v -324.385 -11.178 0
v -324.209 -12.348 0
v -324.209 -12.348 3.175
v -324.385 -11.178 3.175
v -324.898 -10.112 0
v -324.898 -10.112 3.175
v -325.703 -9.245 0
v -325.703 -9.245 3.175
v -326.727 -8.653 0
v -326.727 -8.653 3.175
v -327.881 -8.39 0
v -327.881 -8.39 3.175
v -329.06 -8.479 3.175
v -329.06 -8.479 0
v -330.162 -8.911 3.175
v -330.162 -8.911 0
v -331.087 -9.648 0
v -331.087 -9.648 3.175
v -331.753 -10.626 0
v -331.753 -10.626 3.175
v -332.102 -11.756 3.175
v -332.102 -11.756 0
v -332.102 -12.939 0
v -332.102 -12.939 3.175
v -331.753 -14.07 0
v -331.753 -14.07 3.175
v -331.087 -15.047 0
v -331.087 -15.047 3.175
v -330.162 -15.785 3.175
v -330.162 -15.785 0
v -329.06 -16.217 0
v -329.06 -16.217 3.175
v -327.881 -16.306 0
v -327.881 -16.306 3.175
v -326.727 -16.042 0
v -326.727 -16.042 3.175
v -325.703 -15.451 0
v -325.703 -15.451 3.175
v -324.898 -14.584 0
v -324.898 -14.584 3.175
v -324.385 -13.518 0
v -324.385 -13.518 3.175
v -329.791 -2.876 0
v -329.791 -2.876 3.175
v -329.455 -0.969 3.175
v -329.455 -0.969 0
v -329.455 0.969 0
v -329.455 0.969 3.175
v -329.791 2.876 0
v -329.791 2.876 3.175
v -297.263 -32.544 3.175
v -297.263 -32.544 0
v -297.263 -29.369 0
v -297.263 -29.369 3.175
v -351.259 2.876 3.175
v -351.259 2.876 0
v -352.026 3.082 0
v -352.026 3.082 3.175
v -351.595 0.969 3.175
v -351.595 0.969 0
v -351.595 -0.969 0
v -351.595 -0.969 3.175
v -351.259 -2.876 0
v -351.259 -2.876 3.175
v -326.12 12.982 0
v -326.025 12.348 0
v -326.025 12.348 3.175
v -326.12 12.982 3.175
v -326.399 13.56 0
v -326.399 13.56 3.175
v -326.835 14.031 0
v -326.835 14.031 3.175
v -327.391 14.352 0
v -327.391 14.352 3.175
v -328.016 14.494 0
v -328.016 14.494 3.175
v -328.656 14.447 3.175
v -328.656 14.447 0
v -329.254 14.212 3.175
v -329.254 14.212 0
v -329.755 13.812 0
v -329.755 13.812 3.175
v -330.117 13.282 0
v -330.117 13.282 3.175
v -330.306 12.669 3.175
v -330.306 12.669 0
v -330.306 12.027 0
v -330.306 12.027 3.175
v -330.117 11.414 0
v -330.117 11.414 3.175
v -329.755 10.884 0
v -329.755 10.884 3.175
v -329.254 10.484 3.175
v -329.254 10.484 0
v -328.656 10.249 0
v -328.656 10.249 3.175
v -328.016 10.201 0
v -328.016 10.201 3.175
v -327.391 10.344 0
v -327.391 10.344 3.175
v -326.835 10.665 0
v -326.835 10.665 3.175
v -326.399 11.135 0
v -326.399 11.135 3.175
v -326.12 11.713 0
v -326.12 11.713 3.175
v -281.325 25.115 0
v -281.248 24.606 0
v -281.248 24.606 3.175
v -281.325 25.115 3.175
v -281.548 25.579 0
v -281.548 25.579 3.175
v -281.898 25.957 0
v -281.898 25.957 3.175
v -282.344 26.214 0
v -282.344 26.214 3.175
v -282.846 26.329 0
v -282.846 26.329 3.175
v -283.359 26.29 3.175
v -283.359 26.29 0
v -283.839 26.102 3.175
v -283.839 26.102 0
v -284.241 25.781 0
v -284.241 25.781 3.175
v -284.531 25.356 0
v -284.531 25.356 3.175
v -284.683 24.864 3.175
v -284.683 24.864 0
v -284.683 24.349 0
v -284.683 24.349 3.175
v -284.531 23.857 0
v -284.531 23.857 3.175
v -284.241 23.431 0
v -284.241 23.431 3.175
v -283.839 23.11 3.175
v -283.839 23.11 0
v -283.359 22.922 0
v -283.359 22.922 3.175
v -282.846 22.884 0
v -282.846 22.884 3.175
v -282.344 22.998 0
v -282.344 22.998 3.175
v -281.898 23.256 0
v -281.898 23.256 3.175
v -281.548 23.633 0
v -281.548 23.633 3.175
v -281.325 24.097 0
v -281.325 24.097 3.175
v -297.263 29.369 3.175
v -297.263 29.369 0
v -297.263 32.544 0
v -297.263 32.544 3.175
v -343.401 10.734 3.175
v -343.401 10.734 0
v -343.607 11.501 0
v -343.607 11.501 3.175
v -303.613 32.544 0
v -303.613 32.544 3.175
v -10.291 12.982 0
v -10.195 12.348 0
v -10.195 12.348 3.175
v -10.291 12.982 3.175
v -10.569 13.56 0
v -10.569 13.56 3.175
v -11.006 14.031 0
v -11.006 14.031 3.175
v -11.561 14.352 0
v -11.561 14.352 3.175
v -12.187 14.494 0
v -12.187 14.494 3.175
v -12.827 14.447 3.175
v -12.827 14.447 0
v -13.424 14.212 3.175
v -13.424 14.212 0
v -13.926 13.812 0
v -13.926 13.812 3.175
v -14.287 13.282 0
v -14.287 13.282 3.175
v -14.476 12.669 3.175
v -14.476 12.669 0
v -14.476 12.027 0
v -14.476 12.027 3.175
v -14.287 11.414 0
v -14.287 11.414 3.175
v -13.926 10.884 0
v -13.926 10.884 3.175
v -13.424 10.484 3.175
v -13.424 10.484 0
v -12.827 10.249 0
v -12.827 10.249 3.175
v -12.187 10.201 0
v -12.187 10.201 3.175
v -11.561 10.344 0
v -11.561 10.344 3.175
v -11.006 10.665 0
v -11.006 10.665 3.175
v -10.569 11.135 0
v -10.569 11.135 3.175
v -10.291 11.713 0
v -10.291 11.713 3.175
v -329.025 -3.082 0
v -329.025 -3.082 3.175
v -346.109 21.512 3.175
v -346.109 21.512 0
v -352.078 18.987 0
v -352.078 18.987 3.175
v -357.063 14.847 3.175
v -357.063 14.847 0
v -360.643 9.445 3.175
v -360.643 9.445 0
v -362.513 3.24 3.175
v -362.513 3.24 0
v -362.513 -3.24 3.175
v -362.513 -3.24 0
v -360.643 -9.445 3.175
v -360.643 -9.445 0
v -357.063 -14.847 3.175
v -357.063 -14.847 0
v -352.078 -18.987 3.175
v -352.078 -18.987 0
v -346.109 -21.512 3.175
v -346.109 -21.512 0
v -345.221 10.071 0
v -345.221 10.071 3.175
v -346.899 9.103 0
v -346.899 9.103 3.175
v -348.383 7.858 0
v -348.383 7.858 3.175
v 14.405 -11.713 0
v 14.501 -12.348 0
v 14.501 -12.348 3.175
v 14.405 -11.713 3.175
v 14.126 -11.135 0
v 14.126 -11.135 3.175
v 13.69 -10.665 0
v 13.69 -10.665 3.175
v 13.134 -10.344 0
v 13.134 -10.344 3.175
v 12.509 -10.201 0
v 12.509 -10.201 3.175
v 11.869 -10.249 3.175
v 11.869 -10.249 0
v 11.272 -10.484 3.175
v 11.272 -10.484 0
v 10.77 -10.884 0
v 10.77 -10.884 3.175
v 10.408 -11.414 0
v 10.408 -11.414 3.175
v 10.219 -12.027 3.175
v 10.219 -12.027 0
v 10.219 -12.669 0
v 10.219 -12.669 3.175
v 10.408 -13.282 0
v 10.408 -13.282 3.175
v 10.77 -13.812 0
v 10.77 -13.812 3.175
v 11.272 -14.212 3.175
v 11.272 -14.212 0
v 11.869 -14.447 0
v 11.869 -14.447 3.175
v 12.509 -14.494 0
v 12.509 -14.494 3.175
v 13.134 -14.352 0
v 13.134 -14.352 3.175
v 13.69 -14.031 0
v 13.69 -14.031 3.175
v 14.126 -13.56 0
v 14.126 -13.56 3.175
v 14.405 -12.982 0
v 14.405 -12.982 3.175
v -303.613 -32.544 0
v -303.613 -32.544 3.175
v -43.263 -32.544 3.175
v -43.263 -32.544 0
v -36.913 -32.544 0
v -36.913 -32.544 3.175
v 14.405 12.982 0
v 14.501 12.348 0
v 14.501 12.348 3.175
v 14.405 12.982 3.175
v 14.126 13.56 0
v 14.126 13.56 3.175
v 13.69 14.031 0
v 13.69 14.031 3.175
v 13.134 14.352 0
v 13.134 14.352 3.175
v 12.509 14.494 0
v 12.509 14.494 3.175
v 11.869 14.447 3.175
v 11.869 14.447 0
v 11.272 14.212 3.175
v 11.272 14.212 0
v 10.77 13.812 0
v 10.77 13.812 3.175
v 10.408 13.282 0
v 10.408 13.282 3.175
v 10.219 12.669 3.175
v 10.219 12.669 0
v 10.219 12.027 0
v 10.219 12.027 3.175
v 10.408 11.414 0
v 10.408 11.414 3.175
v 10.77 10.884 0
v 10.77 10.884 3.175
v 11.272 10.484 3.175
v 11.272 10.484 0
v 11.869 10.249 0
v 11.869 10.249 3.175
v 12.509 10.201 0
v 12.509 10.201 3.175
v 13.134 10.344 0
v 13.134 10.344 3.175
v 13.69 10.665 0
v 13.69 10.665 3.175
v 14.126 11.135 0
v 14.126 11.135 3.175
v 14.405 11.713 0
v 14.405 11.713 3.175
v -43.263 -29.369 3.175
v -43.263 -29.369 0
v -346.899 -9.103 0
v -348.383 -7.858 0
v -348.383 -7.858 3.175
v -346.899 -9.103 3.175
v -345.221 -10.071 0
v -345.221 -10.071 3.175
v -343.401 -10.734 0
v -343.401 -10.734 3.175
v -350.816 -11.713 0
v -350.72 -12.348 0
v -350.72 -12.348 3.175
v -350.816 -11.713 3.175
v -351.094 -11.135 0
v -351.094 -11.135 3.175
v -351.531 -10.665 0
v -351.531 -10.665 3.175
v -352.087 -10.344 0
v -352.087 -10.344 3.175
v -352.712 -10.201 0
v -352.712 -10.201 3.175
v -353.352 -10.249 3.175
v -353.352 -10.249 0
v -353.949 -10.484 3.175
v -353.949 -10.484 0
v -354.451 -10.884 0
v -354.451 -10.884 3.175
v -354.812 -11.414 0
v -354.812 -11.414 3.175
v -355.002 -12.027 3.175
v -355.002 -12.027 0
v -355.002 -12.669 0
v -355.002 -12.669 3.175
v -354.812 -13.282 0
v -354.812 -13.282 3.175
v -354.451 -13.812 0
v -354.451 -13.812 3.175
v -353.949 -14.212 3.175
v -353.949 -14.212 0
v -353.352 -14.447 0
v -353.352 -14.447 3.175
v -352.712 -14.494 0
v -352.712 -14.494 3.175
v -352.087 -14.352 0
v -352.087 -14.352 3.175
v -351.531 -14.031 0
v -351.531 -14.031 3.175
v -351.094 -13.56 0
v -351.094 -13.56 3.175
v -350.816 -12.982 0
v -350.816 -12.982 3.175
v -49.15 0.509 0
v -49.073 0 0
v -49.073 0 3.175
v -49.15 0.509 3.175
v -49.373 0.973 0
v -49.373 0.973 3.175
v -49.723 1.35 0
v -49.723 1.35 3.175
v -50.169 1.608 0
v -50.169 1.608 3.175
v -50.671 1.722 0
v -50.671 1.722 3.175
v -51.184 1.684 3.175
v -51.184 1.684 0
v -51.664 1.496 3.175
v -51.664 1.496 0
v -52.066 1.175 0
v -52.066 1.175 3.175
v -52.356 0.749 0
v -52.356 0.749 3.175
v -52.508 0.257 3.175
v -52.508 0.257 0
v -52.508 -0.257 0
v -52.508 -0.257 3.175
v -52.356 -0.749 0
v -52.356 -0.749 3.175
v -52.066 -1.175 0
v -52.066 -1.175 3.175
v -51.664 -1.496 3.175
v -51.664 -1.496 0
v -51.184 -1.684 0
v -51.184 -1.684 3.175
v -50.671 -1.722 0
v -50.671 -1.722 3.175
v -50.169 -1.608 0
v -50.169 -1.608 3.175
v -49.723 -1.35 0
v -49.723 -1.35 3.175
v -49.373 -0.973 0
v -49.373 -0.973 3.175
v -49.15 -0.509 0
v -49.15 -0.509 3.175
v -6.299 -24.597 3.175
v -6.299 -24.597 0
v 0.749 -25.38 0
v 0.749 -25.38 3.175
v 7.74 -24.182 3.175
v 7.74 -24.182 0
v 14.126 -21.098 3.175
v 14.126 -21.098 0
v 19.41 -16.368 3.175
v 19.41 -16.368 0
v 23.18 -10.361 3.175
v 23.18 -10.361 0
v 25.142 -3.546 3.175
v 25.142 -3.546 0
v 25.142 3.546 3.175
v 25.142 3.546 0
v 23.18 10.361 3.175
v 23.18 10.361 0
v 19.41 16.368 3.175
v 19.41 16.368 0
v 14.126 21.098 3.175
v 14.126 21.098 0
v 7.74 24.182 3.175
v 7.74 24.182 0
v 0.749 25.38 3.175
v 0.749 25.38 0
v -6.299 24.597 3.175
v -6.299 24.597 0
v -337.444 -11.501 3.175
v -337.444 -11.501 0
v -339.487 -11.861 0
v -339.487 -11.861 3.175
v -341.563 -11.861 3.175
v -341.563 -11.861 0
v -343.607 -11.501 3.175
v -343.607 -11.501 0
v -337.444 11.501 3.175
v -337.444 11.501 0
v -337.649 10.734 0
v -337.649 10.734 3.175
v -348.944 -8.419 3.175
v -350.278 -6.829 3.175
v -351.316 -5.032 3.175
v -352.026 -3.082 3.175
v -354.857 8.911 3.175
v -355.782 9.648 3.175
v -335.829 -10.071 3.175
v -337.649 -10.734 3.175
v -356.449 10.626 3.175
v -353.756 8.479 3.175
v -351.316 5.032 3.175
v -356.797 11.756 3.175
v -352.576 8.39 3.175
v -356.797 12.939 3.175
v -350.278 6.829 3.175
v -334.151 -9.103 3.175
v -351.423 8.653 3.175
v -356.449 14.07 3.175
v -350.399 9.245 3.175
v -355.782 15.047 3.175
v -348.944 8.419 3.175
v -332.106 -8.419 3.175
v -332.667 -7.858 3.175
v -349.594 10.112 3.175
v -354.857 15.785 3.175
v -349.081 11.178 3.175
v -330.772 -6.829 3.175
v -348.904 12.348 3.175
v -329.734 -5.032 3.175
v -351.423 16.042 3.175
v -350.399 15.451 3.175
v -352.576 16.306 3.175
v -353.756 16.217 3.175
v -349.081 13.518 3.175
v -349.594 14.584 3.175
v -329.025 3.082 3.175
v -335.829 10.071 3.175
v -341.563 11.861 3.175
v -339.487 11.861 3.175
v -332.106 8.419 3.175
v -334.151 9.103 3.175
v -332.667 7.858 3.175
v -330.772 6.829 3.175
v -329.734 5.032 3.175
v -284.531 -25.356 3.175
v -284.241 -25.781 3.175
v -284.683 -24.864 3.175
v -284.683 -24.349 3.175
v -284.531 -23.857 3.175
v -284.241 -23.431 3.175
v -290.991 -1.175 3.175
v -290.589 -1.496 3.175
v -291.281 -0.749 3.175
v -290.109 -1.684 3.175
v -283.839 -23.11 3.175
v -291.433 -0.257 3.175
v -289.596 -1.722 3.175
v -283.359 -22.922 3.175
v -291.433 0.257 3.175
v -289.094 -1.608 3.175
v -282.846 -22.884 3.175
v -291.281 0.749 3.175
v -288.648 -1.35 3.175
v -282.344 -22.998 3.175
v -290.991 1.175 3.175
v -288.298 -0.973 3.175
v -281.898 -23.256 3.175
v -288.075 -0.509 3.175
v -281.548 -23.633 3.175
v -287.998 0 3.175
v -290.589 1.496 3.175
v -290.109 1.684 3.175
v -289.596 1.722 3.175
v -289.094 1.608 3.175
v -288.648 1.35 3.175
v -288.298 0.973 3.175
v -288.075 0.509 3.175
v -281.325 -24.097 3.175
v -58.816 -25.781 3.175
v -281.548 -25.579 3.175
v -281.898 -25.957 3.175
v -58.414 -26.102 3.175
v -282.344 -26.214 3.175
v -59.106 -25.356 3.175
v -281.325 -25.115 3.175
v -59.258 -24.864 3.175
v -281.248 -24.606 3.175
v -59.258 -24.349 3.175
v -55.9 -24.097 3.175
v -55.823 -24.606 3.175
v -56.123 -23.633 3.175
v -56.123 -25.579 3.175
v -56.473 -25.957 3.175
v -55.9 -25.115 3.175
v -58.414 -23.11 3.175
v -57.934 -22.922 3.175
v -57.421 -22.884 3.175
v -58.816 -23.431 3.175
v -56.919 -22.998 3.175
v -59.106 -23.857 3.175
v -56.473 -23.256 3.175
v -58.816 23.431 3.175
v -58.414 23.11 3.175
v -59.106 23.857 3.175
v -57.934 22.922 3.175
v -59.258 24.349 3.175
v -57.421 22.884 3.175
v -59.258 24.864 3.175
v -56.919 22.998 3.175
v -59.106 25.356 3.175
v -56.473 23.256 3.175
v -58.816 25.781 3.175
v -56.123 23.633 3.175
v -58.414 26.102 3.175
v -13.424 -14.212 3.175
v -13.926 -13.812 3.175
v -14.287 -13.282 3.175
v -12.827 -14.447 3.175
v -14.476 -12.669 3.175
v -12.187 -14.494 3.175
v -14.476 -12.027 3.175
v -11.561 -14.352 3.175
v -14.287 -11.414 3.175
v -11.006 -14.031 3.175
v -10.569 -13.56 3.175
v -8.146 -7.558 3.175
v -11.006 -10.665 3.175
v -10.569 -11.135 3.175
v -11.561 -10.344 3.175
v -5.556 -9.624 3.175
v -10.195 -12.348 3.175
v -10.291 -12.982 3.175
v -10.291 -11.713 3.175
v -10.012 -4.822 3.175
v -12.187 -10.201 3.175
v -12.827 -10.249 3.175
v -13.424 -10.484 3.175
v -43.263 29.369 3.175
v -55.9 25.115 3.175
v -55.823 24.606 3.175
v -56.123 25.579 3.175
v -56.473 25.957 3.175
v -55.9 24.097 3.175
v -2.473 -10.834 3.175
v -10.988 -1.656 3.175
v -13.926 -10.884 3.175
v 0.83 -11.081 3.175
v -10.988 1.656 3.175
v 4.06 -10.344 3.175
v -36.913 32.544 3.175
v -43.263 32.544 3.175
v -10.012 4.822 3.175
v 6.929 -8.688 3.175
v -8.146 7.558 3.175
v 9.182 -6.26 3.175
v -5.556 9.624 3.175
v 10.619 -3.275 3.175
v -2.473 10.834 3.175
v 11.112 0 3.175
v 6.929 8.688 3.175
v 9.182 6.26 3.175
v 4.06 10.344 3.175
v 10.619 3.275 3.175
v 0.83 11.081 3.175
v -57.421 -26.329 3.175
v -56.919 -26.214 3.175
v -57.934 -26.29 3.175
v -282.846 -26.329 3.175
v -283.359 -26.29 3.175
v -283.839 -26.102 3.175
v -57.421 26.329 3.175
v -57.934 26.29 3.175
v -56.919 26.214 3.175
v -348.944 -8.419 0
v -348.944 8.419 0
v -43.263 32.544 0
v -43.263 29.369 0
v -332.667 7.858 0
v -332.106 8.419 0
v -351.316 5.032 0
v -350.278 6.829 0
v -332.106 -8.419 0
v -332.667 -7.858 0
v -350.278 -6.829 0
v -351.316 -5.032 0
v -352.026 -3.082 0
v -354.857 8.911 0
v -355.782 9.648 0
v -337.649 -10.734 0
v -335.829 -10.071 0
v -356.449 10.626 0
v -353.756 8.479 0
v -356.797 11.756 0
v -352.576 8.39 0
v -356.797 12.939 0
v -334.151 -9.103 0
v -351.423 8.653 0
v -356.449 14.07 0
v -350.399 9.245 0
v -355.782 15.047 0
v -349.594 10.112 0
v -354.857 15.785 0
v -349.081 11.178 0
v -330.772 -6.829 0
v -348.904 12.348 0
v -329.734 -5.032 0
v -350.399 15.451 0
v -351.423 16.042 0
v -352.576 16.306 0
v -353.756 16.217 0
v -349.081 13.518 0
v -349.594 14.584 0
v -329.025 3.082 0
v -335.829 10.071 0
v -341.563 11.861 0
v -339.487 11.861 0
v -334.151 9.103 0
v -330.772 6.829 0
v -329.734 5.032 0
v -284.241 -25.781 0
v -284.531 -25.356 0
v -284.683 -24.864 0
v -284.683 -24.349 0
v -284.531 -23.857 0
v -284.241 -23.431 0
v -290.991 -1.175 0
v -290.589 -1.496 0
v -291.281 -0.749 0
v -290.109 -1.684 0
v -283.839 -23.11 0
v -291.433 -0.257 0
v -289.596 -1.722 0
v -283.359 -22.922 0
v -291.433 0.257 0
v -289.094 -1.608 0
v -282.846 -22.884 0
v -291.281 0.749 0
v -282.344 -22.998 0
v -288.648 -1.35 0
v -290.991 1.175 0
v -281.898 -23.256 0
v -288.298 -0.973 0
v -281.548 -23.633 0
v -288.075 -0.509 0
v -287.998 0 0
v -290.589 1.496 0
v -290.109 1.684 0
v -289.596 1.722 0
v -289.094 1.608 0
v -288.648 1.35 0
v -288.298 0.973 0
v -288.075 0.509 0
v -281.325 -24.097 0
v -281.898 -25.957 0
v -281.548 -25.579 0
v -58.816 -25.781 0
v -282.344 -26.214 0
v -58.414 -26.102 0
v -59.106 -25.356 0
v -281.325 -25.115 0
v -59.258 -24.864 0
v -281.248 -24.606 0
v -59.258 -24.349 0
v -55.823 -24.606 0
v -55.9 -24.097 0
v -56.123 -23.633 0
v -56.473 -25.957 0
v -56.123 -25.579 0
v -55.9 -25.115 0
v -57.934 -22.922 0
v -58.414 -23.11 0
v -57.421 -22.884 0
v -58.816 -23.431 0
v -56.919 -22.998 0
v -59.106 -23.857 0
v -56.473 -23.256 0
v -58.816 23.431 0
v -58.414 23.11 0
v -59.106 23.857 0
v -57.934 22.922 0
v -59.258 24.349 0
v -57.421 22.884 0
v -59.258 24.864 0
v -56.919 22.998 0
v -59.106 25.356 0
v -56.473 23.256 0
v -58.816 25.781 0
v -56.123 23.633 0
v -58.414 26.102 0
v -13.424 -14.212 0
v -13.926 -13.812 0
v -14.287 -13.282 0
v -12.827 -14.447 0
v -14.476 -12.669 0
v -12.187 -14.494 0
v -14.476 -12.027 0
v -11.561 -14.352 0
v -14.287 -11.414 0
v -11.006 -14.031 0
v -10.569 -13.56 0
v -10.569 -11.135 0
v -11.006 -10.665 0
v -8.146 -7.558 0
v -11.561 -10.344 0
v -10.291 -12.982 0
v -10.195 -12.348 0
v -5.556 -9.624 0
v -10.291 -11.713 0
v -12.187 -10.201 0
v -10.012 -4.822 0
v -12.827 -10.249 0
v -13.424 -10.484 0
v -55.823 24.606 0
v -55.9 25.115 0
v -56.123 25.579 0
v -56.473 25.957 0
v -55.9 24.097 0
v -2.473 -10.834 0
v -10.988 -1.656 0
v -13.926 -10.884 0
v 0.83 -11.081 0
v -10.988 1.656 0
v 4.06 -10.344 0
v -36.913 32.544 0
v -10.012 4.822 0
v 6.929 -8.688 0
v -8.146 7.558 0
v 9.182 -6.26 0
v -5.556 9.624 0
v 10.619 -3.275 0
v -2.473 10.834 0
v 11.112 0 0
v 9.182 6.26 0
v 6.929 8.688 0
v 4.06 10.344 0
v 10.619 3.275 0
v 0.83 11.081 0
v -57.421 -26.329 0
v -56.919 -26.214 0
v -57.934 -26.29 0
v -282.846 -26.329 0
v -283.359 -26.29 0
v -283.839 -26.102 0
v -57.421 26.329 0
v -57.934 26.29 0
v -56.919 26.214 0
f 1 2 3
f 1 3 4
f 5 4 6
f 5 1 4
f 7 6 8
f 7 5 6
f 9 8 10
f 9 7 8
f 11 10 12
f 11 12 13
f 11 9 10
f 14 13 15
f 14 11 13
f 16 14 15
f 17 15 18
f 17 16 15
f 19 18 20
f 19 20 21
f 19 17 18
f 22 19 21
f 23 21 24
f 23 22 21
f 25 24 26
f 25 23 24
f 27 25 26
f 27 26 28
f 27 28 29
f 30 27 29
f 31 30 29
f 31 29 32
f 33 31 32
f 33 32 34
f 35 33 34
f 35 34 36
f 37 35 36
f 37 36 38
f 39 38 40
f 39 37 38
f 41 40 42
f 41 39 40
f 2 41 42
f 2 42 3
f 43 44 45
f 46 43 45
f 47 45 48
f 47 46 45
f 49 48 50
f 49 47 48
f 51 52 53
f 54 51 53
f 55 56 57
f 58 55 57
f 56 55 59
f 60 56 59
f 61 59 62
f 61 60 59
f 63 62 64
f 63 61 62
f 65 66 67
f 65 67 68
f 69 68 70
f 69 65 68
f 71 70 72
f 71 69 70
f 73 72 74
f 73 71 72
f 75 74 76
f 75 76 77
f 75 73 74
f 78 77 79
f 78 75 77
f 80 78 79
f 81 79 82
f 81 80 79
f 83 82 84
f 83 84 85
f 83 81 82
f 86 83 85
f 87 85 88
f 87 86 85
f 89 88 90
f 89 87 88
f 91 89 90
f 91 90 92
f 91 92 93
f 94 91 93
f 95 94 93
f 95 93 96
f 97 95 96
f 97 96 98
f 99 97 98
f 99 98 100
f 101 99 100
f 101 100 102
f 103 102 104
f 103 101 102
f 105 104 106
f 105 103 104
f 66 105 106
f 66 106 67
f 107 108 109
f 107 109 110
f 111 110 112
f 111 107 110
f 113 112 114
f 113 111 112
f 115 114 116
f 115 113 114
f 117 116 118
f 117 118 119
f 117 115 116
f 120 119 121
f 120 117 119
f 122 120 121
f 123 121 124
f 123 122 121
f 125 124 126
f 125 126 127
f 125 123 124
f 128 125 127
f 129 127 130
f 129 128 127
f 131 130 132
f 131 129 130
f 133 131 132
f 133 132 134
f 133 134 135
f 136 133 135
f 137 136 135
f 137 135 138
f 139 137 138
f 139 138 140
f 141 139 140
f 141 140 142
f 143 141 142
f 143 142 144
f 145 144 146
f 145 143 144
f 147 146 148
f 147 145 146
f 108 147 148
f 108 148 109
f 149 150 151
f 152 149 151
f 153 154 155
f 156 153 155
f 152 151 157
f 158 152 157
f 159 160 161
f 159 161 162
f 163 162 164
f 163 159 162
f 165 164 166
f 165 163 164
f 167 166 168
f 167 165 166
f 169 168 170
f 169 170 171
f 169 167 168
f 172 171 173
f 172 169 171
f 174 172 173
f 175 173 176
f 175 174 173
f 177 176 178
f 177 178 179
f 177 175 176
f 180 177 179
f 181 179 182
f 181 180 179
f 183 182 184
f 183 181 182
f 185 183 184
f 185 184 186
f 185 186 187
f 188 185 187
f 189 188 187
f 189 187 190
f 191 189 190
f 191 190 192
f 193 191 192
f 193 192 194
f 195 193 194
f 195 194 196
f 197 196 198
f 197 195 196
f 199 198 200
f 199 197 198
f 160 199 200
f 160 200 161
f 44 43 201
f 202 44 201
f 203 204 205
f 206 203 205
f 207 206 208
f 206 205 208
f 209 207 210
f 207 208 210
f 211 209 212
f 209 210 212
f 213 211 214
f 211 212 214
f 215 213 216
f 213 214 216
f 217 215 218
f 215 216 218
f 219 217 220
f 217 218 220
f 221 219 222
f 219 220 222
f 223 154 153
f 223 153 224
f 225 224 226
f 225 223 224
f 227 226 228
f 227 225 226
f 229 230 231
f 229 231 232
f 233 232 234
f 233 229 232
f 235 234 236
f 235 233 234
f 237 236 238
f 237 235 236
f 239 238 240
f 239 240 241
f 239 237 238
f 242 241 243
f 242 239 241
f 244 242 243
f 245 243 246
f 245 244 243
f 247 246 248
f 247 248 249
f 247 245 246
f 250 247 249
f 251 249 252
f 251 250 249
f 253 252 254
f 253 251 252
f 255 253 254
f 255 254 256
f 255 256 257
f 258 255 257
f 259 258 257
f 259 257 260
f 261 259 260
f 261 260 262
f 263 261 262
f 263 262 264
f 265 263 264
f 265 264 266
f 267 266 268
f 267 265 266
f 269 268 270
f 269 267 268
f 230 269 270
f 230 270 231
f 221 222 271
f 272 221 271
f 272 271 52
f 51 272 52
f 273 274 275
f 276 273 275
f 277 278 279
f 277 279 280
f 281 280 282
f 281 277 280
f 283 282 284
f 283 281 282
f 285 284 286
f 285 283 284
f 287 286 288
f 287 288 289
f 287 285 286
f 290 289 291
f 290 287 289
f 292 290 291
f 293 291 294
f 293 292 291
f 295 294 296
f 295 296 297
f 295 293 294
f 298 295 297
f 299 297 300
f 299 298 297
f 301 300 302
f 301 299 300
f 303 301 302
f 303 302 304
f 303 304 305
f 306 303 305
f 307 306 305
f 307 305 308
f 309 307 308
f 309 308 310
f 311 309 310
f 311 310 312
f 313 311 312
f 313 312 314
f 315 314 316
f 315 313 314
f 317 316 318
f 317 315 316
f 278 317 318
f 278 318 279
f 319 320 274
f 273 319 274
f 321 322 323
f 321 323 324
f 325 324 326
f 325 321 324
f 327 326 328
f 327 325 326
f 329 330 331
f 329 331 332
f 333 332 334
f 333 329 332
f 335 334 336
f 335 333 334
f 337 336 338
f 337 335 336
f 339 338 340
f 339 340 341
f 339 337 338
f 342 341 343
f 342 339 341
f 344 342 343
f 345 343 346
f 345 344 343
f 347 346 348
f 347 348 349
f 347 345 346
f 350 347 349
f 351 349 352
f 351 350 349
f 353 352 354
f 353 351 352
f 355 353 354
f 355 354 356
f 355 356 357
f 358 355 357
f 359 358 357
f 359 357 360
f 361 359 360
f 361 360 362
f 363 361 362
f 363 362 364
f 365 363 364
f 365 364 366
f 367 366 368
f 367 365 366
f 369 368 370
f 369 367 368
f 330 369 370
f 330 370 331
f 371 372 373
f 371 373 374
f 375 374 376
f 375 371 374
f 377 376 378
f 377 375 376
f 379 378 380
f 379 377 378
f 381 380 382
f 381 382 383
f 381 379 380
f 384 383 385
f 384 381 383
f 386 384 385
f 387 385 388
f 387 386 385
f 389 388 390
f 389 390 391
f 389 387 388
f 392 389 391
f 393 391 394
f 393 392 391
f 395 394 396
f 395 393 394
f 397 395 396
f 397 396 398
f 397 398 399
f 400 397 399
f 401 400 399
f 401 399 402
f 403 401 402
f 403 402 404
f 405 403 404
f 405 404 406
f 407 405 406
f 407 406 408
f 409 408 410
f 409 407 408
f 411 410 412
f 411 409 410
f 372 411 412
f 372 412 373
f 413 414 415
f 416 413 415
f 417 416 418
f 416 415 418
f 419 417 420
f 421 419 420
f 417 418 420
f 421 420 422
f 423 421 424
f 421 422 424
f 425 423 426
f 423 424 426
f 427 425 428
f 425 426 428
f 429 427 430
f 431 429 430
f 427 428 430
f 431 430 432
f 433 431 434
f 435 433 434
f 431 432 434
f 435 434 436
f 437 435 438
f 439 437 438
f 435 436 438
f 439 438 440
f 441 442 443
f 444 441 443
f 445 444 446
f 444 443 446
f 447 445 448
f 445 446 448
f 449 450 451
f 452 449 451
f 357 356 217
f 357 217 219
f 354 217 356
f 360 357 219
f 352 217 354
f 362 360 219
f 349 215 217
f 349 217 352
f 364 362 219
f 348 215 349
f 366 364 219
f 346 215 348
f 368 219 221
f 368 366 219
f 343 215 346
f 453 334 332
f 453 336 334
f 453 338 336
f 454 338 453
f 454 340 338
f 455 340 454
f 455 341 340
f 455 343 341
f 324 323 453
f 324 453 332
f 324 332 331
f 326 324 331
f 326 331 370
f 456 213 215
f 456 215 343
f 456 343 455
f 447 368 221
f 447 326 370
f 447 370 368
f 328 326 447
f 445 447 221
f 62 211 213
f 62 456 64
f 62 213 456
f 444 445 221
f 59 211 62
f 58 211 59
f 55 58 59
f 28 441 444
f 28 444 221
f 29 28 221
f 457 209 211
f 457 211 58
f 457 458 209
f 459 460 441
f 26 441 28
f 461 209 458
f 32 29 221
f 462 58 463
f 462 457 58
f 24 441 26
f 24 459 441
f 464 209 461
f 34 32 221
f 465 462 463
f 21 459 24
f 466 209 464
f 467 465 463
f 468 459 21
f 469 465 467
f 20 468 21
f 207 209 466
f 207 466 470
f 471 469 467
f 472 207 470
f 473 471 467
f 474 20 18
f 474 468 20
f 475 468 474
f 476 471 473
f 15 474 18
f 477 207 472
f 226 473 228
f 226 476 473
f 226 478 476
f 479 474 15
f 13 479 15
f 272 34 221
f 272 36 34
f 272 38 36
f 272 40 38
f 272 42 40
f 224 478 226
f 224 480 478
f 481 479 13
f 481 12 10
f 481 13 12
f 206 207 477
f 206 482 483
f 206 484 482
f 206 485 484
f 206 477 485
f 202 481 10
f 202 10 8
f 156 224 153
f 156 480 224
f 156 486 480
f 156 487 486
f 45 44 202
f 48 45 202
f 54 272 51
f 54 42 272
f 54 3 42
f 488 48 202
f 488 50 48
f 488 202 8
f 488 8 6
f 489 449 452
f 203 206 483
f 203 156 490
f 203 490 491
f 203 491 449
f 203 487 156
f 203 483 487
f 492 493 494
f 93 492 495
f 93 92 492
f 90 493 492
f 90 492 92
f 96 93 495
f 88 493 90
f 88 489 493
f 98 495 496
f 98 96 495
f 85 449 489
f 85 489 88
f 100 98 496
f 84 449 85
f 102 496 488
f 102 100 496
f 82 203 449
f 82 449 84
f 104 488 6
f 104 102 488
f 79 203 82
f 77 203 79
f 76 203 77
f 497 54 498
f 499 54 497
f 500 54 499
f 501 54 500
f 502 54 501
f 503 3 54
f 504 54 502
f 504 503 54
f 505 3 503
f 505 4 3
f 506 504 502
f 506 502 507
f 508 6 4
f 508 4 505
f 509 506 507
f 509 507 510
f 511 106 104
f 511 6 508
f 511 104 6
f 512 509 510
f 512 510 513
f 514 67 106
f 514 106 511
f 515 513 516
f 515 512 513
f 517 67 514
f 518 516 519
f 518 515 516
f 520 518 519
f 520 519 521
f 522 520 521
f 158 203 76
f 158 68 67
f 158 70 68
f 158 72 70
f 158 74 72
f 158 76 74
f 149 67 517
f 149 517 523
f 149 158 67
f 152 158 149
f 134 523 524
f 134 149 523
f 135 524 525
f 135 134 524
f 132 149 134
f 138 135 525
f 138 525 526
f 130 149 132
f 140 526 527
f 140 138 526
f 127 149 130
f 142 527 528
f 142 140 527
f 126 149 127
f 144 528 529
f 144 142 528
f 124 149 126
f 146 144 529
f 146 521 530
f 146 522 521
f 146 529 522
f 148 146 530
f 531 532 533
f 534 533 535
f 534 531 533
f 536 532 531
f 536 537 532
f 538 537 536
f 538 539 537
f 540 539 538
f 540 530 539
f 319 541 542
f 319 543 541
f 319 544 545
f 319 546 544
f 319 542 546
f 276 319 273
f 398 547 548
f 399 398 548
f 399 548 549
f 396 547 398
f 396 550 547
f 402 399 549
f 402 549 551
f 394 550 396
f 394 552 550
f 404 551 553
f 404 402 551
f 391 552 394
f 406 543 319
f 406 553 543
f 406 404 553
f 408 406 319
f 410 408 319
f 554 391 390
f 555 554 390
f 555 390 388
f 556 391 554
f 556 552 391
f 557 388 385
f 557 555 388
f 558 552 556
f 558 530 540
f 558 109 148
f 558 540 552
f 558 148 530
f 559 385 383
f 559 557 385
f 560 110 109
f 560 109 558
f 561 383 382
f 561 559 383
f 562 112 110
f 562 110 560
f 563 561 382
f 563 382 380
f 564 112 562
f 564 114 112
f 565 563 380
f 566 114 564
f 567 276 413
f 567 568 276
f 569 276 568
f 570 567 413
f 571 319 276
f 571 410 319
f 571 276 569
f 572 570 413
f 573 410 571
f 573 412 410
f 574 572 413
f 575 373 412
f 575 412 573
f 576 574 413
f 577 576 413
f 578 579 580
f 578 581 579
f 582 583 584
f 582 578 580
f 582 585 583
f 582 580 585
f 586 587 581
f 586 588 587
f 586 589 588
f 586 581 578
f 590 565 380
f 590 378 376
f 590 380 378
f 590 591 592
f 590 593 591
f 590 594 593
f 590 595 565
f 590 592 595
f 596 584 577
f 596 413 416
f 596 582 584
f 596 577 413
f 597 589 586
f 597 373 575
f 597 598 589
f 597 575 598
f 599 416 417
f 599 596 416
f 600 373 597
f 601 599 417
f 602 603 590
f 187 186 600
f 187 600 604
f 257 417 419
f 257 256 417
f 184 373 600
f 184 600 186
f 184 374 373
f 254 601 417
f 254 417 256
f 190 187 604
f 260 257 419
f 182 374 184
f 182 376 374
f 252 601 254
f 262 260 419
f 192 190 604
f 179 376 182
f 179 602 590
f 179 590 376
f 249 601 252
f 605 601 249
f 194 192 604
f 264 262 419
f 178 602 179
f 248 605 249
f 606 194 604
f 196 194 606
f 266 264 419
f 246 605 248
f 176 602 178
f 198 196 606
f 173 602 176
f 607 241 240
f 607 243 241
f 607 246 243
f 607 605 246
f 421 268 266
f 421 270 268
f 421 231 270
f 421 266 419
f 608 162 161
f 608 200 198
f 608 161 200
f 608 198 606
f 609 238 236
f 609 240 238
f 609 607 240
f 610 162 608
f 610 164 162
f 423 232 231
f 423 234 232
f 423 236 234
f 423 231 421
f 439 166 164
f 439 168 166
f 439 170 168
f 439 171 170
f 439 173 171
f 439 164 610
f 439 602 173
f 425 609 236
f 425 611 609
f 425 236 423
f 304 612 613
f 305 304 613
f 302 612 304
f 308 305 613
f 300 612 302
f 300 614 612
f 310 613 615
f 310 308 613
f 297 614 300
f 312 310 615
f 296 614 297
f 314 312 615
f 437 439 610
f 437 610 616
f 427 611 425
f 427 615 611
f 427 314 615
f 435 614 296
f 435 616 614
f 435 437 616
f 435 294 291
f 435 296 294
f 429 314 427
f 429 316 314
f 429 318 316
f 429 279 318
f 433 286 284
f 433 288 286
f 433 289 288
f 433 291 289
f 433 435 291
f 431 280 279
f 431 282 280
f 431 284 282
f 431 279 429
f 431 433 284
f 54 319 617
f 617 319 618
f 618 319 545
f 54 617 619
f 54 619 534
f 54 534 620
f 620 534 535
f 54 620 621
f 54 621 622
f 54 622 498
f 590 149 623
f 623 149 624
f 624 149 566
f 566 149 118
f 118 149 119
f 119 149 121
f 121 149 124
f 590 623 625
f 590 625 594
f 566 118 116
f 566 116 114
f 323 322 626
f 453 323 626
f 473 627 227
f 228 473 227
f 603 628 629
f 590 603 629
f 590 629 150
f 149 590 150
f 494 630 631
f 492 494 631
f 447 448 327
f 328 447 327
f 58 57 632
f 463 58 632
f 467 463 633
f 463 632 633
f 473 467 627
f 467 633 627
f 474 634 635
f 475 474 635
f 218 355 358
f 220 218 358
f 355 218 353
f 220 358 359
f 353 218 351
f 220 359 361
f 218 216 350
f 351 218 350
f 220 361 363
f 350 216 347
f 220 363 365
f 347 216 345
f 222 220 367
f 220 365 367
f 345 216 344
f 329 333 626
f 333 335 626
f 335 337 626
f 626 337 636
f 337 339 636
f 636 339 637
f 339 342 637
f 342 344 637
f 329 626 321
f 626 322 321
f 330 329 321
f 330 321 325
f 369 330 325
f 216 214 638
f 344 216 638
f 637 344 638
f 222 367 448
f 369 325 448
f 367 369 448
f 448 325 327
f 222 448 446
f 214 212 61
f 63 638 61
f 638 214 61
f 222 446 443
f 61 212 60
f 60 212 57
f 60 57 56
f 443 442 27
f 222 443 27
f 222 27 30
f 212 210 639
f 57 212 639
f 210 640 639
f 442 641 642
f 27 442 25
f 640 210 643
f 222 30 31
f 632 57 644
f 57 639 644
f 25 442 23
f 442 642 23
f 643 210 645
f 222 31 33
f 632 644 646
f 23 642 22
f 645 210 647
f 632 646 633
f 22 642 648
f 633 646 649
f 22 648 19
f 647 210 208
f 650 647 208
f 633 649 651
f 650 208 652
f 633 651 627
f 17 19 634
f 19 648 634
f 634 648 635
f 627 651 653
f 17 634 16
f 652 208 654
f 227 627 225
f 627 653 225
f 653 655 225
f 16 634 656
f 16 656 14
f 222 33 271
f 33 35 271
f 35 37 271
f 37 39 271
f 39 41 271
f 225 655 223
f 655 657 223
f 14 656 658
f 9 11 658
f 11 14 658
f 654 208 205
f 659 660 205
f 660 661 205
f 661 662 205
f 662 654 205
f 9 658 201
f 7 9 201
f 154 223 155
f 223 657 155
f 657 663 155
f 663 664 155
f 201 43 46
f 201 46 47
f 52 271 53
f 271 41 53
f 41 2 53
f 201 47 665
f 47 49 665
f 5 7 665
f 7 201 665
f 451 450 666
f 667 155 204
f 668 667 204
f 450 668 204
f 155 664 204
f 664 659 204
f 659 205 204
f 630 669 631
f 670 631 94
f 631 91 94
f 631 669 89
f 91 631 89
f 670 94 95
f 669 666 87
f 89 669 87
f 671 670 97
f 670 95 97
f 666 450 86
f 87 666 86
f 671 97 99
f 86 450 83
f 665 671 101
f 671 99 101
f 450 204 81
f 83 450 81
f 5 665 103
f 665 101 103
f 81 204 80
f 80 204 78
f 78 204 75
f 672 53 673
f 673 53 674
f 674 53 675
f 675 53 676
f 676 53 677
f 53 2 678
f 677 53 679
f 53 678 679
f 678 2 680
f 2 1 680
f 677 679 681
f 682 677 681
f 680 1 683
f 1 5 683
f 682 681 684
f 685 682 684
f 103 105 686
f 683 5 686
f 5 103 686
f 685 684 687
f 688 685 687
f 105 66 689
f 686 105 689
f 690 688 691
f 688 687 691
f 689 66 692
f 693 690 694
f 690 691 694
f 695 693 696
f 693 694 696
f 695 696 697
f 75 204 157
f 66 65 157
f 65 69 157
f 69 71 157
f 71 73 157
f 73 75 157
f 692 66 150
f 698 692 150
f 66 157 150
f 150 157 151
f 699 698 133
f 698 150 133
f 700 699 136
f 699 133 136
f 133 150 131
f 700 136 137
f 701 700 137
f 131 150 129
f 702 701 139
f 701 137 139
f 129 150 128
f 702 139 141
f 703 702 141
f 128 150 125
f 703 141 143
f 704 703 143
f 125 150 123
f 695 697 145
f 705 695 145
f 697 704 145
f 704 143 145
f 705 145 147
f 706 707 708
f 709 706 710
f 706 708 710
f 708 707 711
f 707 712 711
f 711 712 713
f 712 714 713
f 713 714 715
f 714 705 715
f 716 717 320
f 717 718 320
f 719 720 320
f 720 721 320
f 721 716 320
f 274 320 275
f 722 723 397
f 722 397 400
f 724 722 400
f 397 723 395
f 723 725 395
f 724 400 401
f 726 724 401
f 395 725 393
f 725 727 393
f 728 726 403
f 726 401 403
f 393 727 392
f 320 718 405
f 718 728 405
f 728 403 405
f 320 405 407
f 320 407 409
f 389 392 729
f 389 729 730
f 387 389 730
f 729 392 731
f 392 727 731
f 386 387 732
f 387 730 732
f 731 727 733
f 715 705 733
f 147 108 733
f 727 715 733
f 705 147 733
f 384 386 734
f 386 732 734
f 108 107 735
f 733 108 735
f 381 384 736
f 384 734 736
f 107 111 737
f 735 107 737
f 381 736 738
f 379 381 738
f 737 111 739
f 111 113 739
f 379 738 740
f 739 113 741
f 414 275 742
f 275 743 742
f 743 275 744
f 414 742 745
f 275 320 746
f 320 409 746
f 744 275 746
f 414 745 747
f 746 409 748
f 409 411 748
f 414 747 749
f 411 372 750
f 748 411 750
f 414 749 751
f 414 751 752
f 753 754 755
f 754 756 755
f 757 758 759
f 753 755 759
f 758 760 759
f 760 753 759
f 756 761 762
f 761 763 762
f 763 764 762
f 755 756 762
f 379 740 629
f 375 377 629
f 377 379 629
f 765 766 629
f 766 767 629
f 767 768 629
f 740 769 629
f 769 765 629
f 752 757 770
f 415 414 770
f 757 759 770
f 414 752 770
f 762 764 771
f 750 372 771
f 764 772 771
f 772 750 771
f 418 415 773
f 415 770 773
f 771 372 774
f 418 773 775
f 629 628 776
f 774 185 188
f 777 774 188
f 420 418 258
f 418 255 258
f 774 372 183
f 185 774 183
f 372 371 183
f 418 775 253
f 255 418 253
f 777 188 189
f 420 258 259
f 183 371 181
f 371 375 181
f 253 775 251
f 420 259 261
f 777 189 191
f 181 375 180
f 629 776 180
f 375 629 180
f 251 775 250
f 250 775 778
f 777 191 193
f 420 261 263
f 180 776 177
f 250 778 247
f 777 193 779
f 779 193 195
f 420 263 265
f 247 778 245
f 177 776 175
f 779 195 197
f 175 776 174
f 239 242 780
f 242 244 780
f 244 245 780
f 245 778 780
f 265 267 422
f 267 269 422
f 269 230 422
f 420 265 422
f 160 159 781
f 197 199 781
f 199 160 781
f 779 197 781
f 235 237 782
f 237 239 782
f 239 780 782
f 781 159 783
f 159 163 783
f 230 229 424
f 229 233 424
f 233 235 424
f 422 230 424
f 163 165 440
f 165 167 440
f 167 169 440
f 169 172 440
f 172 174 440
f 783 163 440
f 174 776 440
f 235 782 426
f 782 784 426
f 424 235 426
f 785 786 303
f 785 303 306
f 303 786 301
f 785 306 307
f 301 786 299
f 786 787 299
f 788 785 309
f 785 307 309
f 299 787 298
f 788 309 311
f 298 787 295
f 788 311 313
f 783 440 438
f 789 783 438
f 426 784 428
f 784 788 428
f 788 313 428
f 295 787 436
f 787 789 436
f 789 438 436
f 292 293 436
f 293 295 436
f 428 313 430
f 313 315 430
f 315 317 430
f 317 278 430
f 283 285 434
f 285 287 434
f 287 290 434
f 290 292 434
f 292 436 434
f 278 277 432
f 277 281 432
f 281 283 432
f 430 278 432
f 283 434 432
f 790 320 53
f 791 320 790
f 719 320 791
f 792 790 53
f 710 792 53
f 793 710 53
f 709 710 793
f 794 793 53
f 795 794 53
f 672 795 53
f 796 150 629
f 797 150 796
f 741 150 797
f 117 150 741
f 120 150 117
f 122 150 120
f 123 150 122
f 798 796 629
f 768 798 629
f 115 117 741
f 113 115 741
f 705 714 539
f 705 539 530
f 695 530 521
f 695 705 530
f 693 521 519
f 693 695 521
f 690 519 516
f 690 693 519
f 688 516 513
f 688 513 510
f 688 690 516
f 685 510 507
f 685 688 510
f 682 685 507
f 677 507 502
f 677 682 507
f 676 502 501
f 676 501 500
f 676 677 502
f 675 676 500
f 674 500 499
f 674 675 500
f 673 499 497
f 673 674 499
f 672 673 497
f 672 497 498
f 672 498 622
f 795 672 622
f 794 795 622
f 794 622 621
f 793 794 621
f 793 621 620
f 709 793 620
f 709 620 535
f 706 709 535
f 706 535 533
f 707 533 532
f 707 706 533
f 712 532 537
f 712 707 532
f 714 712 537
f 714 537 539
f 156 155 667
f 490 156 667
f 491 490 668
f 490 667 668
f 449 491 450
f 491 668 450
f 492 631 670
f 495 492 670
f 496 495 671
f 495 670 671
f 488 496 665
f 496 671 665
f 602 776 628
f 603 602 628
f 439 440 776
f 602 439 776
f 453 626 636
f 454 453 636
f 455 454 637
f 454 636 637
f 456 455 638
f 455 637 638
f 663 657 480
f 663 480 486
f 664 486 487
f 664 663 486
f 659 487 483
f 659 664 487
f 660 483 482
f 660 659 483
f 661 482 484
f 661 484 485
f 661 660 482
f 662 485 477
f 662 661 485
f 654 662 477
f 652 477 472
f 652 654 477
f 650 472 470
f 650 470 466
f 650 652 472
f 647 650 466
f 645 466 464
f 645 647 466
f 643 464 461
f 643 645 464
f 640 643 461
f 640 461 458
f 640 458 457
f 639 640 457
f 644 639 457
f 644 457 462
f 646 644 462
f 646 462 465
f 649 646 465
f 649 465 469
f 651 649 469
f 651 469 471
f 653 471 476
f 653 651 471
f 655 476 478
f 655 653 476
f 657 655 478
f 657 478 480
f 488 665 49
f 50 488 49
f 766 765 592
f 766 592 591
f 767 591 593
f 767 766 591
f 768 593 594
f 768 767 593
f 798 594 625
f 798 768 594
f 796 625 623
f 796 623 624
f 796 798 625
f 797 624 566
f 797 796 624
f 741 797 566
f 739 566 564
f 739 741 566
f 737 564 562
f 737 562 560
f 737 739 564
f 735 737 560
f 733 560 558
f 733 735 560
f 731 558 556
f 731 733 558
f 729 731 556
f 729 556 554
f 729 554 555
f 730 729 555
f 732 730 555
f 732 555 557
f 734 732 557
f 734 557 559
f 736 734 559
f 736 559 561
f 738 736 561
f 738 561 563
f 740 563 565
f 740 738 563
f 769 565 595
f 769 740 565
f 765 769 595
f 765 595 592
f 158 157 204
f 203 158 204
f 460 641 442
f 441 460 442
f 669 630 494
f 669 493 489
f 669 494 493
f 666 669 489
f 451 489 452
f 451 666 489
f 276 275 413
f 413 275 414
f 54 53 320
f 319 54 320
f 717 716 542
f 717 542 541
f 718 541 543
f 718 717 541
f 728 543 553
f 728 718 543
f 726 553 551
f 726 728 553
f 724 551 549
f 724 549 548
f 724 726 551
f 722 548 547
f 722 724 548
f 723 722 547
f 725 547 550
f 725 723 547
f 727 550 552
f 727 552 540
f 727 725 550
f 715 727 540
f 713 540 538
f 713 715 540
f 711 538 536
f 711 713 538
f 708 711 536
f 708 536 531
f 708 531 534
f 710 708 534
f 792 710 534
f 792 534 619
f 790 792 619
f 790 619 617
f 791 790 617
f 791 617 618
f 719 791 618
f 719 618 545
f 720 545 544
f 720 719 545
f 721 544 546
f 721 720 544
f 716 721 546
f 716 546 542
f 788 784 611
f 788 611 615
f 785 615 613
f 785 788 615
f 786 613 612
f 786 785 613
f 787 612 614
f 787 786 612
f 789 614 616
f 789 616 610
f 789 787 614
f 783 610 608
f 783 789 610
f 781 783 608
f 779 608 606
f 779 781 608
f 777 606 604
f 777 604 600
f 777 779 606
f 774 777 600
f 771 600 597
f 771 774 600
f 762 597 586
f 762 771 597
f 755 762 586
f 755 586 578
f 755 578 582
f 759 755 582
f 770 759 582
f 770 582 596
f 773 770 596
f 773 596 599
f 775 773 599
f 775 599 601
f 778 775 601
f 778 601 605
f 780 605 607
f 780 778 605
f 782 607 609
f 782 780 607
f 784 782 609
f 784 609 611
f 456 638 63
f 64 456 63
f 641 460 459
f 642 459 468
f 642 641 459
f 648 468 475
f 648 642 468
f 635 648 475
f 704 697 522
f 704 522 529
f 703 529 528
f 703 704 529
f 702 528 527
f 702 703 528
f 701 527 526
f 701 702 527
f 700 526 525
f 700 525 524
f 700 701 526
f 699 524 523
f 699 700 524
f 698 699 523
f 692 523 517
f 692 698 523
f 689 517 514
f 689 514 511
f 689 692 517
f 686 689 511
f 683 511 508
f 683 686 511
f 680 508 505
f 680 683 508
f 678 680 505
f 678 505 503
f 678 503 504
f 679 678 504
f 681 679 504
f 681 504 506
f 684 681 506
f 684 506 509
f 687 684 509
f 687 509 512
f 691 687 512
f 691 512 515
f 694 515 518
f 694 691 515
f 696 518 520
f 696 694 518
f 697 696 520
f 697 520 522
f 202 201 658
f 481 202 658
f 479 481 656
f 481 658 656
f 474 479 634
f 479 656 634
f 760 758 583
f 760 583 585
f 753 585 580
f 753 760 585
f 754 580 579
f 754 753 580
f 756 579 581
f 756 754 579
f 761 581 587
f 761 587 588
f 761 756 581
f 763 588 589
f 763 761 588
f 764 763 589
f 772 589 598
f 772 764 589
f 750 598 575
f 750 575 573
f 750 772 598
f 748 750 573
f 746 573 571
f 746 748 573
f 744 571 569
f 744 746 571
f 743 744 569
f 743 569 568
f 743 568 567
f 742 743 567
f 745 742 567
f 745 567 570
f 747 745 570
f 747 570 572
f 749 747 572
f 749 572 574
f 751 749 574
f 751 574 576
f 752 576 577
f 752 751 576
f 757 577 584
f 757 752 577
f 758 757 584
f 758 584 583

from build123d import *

# Parameters (mm, degrees)
F0_R     = 1.7272
F0_R_2   = 2.15265
F0_R_3   = 3.96875
F0_R_4   = 11.1125
F1_DEPTH = 3.175
F3_DEPTH = 3.175
F4_COUNT = 6
F4_ANGLE = 300


with BuildPart() as f1:
    # F0 (on Top) → F1 (new body)
    with BuildSketch(Plane.XY):
        with BuildLine():
            Line((-303.6125627, 32.54375), (-346.1094200534, 21.5120031198))
            ThreePointArc((-346.1094200534, 21.5120031198), (-362.7501254, 0), (-346.1094200534, -21.5120031198))
            Line((-346.1094200534, -21.5120031198), (-303.6125627, -32.54375))
            Line((-303.6125627, -32.54375), (-297.2625627, -32.54375))
            Line((-297.2625627, -32.54375), (-297.2625627, -29.36875))
            Line((-297.2625627, -29.36875), (-43.2625627, -29.36875))
            Line((-43.2625627, -29.36875), (-43.2625627, -32.54375))
            Line((-43.2625627, -32.54375), (-36.9125627, -32.54375))
            Line((-36.9125627, -32.54375), (-6.2993370693, -24.5968716335))
            ThreePointArc((-6.2993370693, -24.5968716335), (25.3907018743, 0), (-6.2993370693, 24.5968716335))
            Line((-6.2993370693, 24.5968716335), (-36.9125627, 32.54375))
            Line((-36.9125627, 32.54375), (-43.2625627, 32.54375))
            Line((-43.2625627, 32.54375), (-43.2625627, 29.36875))
            Line((-43.2625627, 29.36875), (-297.2625627, 29.36875))
            Line((-297.2625627, 29.36875), (-297.2625627, 32.54375))
            Line((-297.2625627, 32.54375), (-303.6125627, 32.54375))
        make_face()
        with Locations((-282.9750627, -24.60625)):
            Circle(F0_R, mode=Mode.SUBTRACT)
        with Locations((-352.8729798, -12.3478544)):
            Circle(F0_R_2, mode=Mode.SUBTRACT)
        with Locations((-328.177271, -12.3478544)):
            Circle(F0_R_3, mode=Mode.SUBTRACT)
        with Locations((-57.5500627, -24.60625)):
            Circle(F0_R, mode=Mode.SUBTRACT)
        with Locations((-12.3478544, -12.3478544)):
            Circle(F0_R_2, mode=Mode.SUBTRACT)
        with Locations((12.3478544, -12.3478544)):
            Circle(F0_R_2, mode=Mode.SUBTRACT)
        with Locations((-340.5251254, 0)):
            Circle(F0_R_4, mode=Mode.SUBTRACT)
        with Locations((-289.7251254, 0)):
            Circle(F0_R, mode=Mode.SUBTRACT)
        with Locations((-352.8729798, 12.3478544)):
            Circle(F0_R_3, mode=Mode.SUBTRACT)
        with Locations((-328.177271, 12.3478544)):
            Circle(F0_R_2, mode=Mode.SUBTRACT)
        with Locations((-282.9750627, 24.60625)):
            Circle(F0_R, mode=Mode.SUBTRACT)
        with Locations((-50.8, 0)):
            Circle(F0_R, mode=Mode.SUBTRACT)
        Circle(F0_R_4, mode=Mode.SUBTRACT)
        with Locations((-12.3478544, 12.3478544)):
            Circle(F0_R_2, mode=Mode.SUBTRACT)
        with Locations((12.3478544, 12.3478544)):
            Circle(F0_R_2, mode=Mode.SUBTRACT)
        with Locations((-57.5500627, 24.60625)):
            Circle(F0_R, mode=Mode.SUBTRACT)
    extrude(amount=F1_DEPTH)

    # F2 (on face) → F3 (cut, through all)
    with BuildSketch(Plane(origin=(0, 0, 0), x_dir=(1, 0, 0), z_dir=(0, 0, -1))):
        with BuildLine():
            ThreePointArc((-348.3828495059, -7.8577241059), (-350.1488326996, -5.55625), (-351.2589761446, -2.8761266387))
            Line((-351.2589761446, -2.8761266387), (-352.0256797693, -3.0815642558))
            ThreePointArc((-352.0256797693, -3.0815642558), (-350.8362403638, -5.953125), (-348.9441155135, -8.4189901135))
            Line((-348.9441155135, -8.4189901135), (-348.3828495059, -7.8577241059))
        make_face()
    f3 = extrude(amount=-F3_DEPTH, mode=Mode.SUBTRACT)

    # F4: F3 ×6 about axis
    f4_axis = Axis((-340.5251254, 0, 0), (0, 0, -1))
    for i in range(1, F4_COUNT):
        add(f3.rotate(f4_axis, i * F4_ANGLE / (F4_COUNT - 1)), mode=Mode.SUBTRACT)


solid = f1.part
